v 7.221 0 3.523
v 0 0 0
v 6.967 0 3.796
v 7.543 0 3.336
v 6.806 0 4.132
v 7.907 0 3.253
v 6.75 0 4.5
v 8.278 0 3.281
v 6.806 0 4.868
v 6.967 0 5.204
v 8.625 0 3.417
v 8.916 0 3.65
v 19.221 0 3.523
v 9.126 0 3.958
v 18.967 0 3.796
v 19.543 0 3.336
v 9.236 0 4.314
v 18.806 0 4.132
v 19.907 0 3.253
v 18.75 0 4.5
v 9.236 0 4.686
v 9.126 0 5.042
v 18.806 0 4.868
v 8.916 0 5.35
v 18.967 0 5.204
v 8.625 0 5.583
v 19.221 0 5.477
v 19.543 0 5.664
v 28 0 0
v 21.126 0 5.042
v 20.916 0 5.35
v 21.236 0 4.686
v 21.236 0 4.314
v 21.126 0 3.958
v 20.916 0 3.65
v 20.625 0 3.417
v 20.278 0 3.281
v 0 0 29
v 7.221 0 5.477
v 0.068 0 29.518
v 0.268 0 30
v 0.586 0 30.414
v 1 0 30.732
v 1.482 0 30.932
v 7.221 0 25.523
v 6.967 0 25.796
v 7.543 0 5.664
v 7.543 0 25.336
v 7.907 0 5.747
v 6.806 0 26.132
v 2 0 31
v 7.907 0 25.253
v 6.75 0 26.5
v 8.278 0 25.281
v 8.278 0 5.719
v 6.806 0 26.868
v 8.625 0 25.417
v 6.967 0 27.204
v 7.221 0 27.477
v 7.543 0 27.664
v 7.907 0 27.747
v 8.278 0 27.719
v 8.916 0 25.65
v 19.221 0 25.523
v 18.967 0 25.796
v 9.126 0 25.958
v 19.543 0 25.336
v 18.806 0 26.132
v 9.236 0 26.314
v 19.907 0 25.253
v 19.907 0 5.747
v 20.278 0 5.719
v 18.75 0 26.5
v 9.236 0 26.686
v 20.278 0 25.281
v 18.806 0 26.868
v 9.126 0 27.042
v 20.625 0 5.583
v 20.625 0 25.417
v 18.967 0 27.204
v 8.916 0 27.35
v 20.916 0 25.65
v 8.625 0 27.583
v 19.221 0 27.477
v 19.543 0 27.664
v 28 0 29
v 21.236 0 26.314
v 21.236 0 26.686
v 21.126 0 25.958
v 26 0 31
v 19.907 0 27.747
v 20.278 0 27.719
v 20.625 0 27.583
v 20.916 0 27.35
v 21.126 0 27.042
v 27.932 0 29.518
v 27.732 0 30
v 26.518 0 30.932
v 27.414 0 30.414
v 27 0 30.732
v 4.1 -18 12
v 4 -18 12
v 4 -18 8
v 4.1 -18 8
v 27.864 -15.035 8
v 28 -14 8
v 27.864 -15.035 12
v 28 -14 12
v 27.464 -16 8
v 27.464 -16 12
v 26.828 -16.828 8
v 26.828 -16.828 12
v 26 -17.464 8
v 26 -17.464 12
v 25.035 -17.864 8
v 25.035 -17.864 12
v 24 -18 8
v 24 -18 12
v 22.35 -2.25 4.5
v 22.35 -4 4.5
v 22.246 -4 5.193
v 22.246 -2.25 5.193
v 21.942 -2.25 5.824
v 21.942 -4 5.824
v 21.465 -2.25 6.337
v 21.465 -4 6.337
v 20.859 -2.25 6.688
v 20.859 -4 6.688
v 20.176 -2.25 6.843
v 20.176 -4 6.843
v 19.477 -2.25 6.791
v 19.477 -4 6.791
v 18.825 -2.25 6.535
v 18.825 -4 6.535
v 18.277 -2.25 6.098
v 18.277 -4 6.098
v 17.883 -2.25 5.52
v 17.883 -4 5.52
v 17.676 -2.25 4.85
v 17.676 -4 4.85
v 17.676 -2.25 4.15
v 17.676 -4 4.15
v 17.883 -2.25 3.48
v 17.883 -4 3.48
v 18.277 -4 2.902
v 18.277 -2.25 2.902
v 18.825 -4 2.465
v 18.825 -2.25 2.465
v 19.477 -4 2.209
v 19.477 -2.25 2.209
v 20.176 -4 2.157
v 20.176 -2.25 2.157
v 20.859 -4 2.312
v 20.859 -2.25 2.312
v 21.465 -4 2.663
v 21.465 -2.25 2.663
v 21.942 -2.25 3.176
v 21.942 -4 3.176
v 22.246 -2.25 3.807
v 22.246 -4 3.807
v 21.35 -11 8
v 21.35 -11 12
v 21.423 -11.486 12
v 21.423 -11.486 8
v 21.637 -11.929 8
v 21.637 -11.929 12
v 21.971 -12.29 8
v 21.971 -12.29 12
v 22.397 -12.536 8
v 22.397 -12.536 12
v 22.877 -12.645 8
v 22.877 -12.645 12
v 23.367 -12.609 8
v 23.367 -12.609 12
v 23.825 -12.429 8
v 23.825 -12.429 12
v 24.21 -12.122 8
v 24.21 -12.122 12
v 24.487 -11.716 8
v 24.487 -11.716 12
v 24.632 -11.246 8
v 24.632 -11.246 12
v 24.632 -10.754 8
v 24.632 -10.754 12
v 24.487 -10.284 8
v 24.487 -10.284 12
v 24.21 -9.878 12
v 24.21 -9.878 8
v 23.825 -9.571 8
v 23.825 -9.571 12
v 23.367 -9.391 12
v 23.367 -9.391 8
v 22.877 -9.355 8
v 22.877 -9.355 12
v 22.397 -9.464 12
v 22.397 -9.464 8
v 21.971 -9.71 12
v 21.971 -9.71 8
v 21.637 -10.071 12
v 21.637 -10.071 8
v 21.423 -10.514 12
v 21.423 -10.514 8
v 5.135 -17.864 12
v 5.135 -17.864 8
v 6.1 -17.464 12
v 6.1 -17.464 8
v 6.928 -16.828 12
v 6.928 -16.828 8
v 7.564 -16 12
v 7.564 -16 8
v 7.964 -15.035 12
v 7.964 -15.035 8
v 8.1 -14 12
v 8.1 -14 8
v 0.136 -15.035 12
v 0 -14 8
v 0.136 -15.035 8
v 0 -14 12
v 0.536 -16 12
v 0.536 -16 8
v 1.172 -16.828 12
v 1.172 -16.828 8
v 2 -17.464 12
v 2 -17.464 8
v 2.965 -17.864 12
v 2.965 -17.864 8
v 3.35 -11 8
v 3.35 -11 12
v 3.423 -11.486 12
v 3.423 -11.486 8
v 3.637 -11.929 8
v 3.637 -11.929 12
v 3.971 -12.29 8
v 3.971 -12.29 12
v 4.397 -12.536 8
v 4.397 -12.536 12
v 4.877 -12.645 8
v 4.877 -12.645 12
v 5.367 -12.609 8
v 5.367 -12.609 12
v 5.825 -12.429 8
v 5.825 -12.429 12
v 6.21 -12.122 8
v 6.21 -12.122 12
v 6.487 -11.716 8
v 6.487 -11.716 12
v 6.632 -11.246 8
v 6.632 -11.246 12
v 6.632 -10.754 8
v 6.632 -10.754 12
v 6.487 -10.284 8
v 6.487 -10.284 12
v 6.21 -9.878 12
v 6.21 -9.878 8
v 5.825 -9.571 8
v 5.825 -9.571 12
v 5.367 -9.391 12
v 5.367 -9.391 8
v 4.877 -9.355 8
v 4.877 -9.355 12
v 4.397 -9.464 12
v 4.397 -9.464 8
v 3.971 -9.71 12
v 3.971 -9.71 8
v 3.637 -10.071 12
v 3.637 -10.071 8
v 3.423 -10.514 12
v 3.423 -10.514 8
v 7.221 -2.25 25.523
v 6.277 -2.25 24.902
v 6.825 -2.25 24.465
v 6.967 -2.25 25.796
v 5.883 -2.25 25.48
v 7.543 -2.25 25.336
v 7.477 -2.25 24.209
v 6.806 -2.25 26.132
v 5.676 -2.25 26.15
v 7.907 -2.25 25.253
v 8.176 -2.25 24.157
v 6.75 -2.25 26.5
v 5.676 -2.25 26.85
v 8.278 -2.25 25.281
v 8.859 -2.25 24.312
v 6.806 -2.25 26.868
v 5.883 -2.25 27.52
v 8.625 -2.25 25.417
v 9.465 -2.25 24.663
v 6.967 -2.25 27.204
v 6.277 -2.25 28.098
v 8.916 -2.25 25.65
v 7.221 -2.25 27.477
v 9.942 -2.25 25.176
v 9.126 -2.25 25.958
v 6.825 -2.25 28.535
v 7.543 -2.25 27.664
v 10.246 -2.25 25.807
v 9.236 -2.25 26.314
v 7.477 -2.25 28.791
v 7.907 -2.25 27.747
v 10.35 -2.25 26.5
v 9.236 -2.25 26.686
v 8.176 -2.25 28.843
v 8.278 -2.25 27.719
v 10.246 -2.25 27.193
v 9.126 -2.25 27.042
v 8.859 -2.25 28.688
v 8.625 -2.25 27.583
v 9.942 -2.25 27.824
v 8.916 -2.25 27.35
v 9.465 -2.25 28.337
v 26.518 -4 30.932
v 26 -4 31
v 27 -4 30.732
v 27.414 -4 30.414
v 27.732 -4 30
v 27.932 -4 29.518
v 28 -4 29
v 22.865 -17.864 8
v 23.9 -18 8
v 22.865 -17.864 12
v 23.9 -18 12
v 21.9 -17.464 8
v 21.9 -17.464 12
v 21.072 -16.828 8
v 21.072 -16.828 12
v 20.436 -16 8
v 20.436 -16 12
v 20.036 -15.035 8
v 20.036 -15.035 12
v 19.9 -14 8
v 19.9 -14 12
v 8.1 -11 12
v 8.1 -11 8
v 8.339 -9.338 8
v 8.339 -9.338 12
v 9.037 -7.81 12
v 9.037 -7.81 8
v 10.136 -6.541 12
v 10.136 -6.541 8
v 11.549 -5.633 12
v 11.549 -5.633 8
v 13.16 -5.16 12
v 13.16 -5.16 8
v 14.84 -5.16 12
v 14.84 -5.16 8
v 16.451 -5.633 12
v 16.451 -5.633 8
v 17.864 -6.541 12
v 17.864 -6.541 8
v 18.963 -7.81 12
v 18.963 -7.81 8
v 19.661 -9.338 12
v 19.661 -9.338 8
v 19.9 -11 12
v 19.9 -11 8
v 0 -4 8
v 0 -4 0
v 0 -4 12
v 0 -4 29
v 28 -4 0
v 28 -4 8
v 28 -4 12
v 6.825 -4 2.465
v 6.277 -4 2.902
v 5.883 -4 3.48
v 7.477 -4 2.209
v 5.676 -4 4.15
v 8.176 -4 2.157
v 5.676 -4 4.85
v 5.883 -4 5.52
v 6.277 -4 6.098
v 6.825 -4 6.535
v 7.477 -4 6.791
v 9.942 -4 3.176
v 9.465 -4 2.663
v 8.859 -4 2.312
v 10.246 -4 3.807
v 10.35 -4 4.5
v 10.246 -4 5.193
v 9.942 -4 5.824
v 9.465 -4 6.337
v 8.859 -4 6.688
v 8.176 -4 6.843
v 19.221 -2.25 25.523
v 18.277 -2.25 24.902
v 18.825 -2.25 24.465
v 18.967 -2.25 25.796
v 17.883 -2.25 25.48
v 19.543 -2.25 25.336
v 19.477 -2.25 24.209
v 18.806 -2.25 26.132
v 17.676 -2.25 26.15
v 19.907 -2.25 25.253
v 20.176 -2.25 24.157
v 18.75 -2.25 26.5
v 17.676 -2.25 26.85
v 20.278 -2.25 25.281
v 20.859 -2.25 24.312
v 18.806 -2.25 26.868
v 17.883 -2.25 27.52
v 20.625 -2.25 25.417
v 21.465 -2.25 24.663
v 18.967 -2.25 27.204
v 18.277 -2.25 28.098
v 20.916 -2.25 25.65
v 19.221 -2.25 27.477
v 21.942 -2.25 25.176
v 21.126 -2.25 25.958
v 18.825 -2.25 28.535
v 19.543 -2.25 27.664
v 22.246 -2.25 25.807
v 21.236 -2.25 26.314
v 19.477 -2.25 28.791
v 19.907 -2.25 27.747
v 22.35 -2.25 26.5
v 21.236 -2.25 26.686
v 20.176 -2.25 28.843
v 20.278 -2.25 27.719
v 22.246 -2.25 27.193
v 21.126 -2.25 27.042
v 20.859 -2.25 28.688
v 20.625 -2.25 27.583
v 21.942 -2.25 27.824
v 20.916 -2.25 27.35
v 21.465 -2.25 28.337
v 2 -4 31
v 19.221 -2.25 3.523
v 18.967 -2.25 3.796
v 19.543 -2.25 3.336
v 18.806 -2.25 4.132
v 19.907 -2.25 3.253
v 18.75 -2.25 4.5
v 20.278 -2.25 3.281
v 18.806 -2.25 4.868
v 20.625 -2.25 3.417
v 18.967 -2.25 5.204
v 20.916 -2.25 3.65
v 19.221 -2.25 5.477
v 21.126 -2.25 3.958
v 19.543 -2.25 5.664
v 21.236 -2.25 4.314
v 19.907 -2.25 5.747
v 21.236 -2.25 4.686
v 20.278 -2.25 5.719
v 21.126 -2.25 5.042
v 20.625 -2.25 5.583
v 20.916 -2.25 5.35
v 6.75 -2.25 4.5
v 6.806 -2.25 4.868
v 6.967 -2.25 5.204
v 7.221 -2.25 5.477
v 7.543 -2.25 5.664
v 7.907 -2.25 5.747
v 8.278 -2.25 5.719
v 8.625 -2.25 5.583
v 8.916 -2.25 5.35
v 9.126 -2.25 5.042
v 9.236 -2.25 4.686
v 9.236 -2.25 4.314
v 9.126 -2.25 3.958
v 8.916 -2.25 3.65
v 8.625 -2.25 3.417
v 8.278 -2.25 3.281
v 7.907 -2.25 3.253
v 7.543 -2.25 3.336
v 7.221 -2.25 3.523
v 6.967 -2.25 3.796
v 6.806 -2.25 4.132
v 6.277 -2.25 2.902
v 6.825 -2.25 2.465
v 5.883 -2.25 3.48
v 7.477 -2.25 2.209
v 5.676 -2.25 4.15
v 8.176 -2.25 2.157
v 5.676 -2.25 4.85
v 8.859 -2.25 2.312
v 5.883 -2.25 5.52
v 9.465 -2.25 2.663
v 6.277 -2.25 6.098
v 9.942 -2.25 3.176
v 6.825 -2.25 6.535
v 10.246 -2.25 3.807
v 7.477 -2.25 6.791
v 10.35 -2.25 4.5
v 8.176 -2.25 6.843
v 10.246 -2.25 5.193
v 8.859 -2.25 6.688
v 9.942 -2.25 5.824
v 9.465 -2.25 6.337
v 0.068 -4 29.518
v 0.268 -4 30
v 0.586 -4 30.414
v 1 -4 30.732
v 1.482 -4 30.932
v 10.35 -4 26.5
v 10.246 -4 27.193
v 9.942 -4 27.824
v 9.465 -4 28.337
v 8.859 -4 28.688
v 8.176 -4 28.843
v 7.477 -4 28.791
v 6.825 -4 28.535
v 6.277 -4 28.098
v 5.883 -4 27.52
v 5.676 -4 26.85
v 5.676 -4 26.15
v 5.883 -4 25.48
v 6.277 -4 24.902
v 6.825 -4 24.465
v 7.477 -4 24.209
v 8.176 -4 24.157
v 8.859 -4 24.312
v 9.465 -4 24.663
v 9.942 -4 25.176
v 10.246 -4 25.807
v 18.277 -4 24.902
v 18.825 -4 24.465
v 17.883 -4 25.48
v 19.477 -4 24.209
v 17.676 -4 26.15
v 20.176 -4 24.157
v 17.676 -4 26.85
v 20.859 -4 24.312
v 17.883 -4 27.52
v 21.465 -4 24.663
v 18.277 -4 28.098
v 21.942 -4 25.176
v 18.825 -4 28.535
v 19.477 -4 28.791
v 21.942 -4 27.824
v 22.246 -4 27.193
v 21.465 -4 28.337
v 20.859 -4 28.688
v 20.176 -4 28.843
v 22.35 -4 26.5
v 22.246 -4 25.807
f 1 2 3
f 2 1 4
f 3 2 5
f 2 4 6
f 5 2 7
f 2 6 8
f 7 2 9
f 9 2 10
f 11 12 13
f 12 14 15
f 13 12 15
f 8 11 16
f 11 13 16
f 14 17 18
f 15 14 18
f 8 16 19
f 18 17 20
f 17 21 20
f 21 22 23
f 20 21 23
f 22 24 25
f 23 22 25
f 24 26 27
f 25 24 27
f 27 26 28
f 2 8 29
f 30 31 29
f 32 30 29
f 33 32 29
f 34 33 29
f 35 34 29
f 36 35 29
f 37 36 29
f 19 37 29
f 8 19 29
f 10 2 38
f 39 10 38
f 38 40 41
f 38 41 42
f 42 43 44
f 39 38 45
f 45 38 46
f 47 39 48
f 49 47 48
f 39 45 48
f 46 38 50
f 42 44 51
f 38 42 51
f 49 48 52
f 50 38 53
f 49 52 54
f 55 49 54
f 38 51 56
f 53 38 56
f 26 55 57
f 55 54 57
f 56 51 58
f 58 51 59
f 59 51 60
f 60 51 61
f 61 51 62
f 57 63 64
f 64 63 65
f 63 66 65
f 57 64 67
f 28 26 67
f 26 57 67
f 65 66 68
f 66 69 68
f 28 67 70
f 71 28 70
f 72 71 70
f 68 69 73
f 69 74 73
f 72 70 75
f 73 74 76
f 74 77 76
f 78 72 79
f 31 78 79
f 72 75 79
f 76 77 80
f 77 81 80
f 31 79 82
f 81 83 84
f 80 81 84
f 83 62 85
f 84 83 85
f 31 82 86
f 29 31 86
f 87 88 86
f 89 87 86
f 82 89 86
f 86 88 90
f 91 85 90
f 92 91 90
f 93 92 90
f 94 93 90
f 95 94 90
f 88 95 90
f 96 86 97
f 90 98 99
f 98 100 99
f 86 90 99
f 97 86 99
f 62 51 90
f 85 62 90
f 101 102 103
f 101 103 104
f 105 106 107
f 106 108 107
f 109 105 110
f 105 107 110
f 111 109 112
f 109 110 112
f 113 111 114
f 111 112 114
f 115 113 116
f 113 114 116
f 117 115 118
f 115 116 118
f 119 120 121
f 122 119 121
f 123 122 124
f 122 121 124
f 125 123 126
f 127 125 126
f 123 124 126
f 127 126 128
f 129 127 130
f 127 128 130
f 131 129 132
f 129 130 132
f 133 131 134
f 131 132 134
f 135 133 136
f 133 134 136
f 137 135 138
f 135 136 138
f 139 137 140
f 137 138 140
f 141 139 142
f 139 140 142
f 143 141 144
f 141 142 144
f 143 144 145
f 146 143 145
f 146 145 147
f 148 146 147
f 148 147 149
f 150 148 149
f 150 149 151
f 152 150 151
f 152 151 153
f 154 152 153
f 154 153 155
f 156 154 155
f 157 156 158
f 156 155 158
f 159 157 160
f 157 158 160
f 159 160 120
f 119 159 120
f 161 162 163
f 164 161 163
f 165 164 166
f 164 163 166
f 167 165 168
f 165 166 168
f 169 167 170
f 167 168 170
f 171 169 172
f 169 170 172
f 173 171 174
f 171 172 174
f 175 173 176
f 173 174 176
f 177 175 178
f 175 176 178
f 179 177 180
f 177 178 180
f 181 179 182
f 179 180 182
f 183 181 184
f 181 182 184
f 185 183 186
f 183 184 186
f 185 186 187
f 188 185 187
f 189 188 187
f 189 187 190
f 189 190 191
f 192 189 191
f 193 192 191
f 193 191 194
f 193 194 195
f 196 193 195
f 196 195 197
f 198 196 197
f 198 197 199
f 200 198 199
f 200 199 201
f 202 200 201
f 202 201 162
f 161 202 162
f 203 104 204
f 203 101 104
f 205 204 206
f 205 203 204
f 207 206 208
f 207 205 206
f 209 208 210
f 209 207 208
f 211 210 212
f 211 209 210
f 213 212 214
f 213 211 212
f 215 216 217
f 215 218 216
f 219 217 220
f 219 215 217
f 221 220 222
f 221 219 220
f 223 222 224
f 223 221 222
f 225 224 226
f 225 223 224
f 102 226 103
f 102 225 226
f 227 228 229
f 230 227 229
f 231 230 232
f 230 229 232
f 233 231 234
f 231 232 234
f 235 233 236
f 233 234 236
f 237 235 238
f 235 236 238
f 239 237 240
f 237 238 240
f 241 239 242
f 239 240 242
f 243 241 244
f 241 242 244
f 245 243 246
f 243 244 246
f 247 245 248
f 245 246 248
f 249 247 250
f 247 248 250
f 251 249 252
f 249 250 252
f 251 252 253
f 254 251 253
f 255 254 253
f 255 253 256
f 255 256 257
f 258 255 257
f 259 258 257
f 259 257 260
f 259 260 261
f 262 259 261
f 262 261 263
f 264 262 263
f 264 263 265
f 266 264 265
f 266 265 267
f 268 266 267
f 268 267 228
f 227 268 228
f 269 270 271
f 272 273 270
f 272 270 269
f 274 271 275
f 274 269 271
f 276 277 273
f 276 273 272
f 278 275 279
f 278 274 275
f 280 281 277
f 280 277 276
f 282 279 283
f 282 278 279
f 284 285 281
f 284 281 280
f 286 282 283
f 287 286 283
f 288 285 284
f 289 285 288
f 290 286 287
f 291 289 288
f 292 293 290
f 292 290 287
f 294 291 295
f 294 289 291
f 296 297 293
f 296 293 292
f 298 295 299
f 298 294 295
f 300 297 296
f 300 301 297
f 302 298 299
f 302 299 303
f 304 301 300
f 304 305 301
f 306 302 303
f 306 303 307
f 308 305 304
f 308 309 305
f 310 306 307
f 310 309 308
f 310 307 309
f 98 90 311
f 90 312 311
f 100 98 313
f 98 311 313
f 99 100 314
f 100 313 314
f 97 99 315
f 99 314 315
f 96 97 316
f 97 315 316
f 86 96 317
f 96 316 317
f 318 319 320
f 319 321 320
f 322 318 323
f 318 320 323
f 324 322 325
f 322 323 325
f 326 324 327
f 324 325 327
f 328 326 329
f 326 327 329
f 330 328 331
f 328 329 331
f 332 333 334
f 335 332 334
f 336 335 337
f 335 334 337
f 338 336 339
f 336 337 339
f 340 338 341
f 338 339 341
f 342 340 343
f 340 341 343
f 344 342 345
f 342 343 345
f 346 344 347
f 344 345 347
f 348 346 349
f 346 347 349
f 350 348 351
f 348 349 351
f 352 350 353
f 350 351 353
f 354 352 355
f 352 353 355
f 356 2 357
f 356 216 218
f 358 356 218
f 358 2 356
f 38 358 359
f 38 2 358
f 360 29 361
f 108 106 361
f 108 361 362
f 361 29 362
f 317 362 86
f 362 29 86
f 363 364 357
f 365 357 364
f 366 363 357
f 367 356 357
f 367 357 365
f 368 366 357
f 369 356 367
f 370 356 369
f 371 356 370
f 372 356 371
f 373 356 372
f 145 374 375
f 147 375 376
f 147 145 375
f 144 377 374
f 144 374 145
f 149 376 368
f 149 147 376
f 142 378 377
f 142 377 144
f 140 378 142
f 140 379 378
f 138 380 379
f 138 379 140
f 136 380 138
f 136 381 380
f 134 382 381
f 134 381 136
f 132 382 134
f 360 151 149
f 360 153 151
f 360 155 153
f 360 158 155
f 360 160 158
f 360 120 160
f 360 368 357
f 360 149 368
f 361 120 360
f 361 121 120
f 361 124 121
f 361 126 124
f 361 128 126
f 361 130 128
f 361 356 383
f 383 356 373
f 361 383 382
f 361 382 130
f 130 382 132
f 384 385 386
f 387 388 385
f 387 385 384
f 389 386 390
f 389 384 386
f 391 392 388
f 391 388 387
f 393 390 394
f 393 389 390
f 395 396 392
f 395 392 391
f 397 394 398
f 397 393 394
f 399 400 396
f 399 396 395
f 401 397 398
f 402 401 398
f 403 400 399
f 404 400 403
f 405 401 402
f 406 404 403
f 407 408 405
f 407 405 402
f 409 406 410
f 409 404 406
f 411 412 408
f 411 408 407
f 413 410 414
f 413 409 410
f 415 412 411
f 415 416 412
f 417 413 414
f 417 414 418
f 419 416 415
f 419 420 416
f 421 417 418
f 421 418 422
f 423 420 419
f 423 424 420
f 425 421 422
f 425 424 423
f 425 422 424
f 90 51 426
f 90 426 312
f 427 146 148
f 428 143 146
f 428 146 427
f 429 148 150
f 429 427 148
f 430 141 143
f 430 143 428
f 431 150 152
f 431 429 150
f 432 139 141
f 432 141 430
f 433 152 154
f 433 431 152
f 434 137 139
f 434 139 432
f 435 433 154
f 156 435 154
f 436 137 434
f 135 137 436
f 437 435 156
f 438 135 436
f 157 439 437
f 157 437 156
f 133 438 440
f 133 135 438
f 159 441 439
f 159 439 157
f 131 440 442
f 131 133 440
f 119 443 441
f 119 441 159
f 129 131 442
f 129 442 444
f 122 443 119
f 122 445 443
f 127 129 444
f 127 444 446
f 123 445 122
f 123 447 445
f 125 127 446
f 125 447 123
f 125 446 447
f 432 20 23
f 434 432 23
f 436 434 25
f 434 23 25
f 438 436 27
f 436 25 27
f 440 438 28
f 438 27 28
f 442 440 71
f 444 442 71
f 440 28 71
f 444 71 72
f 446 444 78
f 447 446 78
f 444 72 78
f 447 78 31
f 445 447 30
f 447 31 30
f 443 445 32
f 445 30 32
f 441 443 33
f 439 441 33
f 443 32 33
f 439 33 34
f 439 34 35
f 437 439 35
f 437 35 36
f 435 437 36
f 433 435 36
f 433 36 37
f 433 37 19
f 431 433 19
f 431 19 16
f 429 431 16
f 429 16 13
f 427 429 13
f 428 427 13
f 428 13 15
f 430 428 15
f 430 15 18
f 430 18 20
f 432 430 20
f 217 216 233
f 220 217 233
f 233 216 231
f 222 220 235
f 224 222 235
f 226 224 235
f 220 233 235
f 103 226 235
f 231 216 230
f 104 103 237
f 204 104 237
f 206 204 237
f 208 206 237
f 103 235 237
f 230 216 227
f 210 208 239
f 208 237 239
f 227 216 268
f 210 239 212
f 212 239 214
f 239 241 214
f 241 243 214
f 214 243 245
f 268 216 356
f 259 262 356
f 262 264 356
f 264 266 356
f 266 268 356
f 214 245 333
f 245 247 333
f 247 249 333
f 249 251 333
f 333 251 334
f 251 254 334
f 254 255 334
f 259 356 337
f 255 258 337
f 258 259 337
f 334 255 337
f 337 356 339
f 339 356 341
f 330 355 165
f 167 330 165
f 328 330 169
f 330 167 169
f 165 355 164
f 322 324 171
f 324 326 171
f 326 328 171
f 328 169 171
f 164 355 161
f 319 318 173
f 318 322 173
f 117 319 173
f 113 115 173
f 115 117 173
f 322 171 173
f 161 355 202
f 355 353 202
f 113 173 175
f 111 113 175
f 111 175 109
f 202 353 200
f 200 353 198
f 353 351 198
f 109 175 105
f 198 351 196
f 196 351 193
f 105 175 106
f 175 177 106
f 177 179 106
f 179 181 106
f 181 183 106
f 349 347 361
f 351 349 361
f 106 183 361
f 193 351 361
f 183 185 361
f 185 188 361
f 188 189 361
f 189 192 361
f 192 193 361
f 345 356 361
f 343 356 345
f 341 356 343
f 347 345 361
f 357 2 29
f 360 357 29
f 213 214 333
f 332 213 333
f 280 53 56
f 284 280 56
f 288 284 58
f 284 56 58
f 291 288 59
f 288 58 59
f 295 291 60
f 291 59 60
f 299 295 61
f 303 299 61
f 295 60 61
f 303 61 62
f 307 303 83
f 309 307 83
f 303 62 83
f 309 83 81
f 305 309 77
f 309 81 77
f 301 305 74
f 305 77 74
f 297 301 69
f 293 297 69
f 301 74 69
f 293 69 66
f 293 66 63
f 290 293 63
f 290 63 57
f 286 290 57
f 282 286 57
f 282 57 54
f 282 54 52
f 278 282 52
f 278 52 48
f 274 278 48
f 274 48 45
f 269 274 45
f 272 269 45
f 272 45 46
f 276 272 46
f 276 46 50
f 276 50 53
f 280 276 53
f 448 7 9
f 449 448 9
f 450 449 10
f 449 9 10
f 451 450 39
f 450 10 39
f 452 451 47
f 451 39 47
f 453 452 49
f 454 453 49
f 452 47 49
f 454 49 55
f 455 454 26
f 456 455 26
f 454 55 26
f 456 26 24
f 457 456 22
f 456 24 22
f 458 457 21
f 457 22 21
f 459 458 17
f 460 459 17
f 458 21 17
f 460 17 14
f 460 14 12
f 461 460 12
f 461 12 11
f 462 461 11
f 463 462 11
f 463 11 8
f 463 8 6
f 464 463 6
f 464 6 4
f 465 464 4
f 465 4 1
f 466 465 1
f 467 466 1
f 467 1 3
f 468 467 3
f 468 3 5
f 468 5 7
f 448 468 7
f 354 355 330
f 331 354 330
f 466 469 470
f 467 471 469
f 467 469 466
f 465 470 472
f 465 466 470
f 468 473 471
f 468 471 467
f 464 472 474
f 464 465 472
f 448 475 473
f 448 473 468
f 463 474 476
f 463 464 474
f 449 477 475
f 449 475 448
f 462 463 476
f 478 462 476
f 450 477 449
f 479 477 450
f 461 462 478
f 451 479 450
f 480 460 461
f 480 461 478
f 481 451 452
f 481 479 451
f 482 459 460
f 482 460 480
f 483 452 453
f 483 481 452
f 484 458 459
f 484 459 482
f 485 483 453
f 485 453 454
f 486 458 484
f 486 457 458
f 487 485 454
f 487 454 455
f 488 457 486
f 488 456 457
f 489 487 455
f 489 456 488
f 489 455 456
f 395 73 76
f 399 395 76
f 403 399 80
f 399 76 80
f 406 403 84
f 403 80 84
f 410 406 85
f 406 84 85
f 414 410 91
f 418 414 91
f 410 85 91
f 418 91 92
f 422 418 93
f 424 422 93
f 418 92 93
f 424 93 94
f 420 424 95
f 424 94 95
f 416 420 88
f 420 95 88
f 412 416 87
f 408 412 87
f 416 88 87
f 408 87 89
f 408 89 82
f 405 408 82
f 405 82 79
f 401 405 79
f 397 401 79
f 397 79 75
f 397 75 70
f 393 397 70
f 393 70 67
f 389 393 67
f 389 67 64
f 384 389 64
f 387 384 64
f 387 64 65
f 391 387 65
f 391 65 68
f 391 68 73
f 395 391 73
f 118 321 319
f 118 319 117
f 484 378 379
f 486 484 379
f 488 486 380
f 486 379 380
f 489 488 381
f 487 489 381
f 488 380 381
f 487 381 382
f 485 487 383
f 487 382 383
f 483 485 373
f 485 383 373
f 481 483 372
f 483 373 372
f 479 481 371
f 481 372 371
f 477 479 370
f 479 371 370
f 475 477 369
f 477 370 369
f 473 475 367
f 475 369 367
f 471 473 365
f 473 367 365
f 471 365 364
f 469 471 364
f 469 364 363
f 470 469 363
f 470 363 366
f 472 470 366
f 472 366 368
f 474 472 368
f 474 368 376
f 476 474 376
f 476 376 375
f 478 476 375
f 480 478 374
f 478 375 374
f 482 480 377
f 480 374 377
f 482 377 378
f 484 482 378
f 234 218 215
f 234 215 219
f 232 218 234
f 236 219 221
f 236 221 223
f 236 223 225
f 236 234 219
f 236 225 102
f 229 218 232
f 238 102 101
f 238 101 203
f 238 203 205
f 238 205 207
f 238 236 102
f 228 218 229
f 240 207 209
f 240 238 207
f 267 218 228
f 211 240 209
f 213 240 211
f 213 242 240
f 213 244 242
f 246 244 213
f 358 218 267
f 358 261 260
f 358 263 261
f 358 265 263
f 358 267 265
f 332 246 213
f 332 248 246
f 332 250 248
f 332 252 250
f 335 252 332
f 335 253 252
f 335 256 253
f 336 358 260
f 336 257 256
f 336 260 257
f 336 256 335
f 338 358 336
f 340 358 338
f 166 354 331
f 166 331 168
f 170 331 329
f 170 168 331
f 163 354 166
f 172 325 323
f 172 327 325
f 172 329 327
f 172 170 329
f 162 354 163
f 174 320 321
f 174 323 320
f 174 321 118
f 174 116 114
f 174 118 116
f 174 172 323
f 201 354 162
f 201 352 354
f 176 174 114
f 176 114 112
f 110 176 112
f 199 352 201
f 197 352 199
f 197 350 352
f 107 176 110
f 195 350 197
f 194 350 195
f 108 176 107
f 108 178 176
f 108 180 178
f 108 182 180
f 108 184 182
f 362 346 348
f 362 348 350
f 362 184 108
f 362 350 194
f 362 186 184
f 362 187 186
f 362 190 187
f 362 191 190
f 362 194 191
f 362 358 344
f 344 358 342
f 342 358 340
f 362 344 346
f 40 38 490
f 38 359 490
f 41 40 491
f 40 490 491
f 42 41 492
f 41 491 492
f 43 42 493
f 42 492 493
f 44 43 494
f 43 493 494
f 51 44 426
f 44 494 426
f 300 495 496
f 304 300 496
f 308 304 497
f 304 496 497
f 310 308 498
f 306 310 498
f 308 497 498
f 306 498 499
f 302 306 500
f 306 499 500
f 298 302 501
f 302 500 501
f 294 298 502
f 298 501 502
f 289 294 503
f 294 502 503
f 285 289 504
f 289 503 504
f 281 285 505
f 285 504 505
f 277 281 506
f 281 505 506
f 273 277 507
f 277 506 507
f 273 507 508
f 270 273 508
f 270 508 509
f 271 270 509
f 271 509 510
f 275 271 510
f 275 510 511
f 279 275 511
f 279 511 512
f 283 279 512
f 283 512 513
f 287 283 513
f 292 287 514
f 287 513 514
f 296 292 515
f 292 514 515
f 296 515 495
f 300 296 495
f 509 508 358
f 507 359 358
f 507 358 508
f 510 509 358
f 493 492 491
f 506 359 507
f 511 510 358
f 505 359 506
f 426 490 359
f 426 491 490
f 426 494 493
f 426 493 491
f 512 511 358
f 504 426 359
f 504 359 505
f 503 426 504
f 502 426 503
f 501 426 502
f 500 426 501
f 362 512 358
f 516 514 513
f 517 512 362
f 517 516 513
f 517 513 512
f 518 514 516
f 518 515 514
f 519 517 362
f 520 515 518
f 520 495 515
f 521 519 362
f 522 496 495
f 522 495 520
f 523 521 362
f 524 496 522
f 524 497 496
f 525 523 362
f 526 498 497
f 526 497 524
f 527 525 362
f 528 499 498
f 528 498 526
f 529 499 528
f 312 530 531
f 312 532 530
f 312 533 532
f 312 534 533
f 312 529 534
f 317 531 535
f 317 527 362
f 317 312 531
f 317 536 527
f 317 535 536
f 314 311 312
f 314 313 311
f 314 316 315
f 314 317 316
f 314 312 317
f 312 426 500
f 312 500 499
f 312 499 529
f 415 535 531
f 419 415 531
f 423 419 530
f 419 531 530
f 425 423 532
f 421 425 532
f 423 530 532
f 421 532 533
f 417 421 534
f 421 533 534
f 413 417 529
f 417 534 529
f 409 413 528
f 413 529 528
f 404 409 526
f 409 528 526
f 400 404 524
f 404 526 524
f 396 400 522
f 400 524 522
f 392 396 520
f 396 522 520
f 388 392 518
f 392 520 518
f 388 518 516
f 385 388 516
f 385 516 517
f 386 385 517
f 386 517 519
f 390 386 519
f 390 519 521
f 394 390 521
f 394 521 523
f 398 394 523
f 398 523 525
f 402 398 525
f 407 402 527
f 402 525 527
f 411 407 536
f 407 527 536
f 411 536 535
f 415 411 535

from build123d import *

# Parameters (mm, degrees)
F0_W      = 28
F0_H      = 31
F1_DEPTH  = 4
F3_D      = 2.5
F2_W      = 28
F2_H      = 4
F4_DEPTH  = 14
F6_DEPTH  = 25
F7_D      = 3.3
F8_R      = 4
F9_R      = 2
F2_R      = 2.35
F10_DEPTH = 1.75


with BuildPart() as f1:
    # F0 (on Front) → F1 (new body)
    with BuildSketch(Plane.XZ):
        with Locations((14, 15.5)):
            Rectangle(F0_W, F0_H)
    extrude(amount=F1_DEPTH)

    # F3 (through all)
    with Locations(Plane.XZ.offset(4)):
        with Locations((8, 26.5), (20, 26.5), (20, 4.5), (8, 4.5)):
            Hole(F3_D / 2)

    # F2 (on face) → F4 (join)
    with BuildSketch(Plane.XZ.offset(4)):
        with Locations((14, 10)):
            Rectangle(F2_W, F2_H)
    extrude(amount=F4_DEPTH)

    # F5 (on face) → F6 (cut)
    with BuildSketch(Plane(origin=(0, 0, 8), x_dir=(1, 0, 0), z_dir=(0, 0, -1))):
        with BuildLine():
            ThreePointArc((8.1, 11), (14, 16.9), (19.9, 11))
            Line((19.9, 11), (19.9, 18))
            Line((19.9, 18), (8.1, 18))
            Line((8.1, 18), (8.1, 11))
        make_face()
        with BuildLine():
            ThreePointArc((8.1, 11), (14, 5.1), (19.9, 11))
            ThreePointArc((19.9, 11), (14, 16.9), (8.1, 11))
        make_face()
    extrude(amount=-F6_DEPTH, mode=Mode.SUBTRACT)

    # F7 (through all)
    with Locations(Plane(origin=(0, 0, 8), x_dir=(1, 0, 0), z_dir=(0, 0, -1))):
        with Locations((5, 11), (23, 11)):
            Hole(F7_D / 2)

    # F8
    f8_edges = [f1.edges().sort_by_distance(p)[0] for p in [
        (28, -18, 10),
        (19.9, -18, 10),
        (8.1, -18, 10),
        (0, -18, 10),
    ]]
    fillet(f8_edges, radius=F8_R)

    # F9
    f9_edges = [f1.edges().sort_by_distance(p)[0] for p in [
        (28, -2, 31),
        (0, -2, 31),
    ]]
    fillet(f9_edges, radius=F9_R)

    # F2 (on face) → F10 (cut)
    with BuildSketch(Plane.XZ.offset(4)):
        with Locations((8, 26.5)):
            Circle(F2_R)
        with Locations((20, 26.5)):
            Circle(F2_R)
        with Locations((20, 4.5)):
            Circle(F2_R)
        with Locations((8, 4.5)):
            Circle(F2_R)
    extrude(amount=-F10_DEPTH, mode=Mode.SUBTRACT)


solid = f1.part
